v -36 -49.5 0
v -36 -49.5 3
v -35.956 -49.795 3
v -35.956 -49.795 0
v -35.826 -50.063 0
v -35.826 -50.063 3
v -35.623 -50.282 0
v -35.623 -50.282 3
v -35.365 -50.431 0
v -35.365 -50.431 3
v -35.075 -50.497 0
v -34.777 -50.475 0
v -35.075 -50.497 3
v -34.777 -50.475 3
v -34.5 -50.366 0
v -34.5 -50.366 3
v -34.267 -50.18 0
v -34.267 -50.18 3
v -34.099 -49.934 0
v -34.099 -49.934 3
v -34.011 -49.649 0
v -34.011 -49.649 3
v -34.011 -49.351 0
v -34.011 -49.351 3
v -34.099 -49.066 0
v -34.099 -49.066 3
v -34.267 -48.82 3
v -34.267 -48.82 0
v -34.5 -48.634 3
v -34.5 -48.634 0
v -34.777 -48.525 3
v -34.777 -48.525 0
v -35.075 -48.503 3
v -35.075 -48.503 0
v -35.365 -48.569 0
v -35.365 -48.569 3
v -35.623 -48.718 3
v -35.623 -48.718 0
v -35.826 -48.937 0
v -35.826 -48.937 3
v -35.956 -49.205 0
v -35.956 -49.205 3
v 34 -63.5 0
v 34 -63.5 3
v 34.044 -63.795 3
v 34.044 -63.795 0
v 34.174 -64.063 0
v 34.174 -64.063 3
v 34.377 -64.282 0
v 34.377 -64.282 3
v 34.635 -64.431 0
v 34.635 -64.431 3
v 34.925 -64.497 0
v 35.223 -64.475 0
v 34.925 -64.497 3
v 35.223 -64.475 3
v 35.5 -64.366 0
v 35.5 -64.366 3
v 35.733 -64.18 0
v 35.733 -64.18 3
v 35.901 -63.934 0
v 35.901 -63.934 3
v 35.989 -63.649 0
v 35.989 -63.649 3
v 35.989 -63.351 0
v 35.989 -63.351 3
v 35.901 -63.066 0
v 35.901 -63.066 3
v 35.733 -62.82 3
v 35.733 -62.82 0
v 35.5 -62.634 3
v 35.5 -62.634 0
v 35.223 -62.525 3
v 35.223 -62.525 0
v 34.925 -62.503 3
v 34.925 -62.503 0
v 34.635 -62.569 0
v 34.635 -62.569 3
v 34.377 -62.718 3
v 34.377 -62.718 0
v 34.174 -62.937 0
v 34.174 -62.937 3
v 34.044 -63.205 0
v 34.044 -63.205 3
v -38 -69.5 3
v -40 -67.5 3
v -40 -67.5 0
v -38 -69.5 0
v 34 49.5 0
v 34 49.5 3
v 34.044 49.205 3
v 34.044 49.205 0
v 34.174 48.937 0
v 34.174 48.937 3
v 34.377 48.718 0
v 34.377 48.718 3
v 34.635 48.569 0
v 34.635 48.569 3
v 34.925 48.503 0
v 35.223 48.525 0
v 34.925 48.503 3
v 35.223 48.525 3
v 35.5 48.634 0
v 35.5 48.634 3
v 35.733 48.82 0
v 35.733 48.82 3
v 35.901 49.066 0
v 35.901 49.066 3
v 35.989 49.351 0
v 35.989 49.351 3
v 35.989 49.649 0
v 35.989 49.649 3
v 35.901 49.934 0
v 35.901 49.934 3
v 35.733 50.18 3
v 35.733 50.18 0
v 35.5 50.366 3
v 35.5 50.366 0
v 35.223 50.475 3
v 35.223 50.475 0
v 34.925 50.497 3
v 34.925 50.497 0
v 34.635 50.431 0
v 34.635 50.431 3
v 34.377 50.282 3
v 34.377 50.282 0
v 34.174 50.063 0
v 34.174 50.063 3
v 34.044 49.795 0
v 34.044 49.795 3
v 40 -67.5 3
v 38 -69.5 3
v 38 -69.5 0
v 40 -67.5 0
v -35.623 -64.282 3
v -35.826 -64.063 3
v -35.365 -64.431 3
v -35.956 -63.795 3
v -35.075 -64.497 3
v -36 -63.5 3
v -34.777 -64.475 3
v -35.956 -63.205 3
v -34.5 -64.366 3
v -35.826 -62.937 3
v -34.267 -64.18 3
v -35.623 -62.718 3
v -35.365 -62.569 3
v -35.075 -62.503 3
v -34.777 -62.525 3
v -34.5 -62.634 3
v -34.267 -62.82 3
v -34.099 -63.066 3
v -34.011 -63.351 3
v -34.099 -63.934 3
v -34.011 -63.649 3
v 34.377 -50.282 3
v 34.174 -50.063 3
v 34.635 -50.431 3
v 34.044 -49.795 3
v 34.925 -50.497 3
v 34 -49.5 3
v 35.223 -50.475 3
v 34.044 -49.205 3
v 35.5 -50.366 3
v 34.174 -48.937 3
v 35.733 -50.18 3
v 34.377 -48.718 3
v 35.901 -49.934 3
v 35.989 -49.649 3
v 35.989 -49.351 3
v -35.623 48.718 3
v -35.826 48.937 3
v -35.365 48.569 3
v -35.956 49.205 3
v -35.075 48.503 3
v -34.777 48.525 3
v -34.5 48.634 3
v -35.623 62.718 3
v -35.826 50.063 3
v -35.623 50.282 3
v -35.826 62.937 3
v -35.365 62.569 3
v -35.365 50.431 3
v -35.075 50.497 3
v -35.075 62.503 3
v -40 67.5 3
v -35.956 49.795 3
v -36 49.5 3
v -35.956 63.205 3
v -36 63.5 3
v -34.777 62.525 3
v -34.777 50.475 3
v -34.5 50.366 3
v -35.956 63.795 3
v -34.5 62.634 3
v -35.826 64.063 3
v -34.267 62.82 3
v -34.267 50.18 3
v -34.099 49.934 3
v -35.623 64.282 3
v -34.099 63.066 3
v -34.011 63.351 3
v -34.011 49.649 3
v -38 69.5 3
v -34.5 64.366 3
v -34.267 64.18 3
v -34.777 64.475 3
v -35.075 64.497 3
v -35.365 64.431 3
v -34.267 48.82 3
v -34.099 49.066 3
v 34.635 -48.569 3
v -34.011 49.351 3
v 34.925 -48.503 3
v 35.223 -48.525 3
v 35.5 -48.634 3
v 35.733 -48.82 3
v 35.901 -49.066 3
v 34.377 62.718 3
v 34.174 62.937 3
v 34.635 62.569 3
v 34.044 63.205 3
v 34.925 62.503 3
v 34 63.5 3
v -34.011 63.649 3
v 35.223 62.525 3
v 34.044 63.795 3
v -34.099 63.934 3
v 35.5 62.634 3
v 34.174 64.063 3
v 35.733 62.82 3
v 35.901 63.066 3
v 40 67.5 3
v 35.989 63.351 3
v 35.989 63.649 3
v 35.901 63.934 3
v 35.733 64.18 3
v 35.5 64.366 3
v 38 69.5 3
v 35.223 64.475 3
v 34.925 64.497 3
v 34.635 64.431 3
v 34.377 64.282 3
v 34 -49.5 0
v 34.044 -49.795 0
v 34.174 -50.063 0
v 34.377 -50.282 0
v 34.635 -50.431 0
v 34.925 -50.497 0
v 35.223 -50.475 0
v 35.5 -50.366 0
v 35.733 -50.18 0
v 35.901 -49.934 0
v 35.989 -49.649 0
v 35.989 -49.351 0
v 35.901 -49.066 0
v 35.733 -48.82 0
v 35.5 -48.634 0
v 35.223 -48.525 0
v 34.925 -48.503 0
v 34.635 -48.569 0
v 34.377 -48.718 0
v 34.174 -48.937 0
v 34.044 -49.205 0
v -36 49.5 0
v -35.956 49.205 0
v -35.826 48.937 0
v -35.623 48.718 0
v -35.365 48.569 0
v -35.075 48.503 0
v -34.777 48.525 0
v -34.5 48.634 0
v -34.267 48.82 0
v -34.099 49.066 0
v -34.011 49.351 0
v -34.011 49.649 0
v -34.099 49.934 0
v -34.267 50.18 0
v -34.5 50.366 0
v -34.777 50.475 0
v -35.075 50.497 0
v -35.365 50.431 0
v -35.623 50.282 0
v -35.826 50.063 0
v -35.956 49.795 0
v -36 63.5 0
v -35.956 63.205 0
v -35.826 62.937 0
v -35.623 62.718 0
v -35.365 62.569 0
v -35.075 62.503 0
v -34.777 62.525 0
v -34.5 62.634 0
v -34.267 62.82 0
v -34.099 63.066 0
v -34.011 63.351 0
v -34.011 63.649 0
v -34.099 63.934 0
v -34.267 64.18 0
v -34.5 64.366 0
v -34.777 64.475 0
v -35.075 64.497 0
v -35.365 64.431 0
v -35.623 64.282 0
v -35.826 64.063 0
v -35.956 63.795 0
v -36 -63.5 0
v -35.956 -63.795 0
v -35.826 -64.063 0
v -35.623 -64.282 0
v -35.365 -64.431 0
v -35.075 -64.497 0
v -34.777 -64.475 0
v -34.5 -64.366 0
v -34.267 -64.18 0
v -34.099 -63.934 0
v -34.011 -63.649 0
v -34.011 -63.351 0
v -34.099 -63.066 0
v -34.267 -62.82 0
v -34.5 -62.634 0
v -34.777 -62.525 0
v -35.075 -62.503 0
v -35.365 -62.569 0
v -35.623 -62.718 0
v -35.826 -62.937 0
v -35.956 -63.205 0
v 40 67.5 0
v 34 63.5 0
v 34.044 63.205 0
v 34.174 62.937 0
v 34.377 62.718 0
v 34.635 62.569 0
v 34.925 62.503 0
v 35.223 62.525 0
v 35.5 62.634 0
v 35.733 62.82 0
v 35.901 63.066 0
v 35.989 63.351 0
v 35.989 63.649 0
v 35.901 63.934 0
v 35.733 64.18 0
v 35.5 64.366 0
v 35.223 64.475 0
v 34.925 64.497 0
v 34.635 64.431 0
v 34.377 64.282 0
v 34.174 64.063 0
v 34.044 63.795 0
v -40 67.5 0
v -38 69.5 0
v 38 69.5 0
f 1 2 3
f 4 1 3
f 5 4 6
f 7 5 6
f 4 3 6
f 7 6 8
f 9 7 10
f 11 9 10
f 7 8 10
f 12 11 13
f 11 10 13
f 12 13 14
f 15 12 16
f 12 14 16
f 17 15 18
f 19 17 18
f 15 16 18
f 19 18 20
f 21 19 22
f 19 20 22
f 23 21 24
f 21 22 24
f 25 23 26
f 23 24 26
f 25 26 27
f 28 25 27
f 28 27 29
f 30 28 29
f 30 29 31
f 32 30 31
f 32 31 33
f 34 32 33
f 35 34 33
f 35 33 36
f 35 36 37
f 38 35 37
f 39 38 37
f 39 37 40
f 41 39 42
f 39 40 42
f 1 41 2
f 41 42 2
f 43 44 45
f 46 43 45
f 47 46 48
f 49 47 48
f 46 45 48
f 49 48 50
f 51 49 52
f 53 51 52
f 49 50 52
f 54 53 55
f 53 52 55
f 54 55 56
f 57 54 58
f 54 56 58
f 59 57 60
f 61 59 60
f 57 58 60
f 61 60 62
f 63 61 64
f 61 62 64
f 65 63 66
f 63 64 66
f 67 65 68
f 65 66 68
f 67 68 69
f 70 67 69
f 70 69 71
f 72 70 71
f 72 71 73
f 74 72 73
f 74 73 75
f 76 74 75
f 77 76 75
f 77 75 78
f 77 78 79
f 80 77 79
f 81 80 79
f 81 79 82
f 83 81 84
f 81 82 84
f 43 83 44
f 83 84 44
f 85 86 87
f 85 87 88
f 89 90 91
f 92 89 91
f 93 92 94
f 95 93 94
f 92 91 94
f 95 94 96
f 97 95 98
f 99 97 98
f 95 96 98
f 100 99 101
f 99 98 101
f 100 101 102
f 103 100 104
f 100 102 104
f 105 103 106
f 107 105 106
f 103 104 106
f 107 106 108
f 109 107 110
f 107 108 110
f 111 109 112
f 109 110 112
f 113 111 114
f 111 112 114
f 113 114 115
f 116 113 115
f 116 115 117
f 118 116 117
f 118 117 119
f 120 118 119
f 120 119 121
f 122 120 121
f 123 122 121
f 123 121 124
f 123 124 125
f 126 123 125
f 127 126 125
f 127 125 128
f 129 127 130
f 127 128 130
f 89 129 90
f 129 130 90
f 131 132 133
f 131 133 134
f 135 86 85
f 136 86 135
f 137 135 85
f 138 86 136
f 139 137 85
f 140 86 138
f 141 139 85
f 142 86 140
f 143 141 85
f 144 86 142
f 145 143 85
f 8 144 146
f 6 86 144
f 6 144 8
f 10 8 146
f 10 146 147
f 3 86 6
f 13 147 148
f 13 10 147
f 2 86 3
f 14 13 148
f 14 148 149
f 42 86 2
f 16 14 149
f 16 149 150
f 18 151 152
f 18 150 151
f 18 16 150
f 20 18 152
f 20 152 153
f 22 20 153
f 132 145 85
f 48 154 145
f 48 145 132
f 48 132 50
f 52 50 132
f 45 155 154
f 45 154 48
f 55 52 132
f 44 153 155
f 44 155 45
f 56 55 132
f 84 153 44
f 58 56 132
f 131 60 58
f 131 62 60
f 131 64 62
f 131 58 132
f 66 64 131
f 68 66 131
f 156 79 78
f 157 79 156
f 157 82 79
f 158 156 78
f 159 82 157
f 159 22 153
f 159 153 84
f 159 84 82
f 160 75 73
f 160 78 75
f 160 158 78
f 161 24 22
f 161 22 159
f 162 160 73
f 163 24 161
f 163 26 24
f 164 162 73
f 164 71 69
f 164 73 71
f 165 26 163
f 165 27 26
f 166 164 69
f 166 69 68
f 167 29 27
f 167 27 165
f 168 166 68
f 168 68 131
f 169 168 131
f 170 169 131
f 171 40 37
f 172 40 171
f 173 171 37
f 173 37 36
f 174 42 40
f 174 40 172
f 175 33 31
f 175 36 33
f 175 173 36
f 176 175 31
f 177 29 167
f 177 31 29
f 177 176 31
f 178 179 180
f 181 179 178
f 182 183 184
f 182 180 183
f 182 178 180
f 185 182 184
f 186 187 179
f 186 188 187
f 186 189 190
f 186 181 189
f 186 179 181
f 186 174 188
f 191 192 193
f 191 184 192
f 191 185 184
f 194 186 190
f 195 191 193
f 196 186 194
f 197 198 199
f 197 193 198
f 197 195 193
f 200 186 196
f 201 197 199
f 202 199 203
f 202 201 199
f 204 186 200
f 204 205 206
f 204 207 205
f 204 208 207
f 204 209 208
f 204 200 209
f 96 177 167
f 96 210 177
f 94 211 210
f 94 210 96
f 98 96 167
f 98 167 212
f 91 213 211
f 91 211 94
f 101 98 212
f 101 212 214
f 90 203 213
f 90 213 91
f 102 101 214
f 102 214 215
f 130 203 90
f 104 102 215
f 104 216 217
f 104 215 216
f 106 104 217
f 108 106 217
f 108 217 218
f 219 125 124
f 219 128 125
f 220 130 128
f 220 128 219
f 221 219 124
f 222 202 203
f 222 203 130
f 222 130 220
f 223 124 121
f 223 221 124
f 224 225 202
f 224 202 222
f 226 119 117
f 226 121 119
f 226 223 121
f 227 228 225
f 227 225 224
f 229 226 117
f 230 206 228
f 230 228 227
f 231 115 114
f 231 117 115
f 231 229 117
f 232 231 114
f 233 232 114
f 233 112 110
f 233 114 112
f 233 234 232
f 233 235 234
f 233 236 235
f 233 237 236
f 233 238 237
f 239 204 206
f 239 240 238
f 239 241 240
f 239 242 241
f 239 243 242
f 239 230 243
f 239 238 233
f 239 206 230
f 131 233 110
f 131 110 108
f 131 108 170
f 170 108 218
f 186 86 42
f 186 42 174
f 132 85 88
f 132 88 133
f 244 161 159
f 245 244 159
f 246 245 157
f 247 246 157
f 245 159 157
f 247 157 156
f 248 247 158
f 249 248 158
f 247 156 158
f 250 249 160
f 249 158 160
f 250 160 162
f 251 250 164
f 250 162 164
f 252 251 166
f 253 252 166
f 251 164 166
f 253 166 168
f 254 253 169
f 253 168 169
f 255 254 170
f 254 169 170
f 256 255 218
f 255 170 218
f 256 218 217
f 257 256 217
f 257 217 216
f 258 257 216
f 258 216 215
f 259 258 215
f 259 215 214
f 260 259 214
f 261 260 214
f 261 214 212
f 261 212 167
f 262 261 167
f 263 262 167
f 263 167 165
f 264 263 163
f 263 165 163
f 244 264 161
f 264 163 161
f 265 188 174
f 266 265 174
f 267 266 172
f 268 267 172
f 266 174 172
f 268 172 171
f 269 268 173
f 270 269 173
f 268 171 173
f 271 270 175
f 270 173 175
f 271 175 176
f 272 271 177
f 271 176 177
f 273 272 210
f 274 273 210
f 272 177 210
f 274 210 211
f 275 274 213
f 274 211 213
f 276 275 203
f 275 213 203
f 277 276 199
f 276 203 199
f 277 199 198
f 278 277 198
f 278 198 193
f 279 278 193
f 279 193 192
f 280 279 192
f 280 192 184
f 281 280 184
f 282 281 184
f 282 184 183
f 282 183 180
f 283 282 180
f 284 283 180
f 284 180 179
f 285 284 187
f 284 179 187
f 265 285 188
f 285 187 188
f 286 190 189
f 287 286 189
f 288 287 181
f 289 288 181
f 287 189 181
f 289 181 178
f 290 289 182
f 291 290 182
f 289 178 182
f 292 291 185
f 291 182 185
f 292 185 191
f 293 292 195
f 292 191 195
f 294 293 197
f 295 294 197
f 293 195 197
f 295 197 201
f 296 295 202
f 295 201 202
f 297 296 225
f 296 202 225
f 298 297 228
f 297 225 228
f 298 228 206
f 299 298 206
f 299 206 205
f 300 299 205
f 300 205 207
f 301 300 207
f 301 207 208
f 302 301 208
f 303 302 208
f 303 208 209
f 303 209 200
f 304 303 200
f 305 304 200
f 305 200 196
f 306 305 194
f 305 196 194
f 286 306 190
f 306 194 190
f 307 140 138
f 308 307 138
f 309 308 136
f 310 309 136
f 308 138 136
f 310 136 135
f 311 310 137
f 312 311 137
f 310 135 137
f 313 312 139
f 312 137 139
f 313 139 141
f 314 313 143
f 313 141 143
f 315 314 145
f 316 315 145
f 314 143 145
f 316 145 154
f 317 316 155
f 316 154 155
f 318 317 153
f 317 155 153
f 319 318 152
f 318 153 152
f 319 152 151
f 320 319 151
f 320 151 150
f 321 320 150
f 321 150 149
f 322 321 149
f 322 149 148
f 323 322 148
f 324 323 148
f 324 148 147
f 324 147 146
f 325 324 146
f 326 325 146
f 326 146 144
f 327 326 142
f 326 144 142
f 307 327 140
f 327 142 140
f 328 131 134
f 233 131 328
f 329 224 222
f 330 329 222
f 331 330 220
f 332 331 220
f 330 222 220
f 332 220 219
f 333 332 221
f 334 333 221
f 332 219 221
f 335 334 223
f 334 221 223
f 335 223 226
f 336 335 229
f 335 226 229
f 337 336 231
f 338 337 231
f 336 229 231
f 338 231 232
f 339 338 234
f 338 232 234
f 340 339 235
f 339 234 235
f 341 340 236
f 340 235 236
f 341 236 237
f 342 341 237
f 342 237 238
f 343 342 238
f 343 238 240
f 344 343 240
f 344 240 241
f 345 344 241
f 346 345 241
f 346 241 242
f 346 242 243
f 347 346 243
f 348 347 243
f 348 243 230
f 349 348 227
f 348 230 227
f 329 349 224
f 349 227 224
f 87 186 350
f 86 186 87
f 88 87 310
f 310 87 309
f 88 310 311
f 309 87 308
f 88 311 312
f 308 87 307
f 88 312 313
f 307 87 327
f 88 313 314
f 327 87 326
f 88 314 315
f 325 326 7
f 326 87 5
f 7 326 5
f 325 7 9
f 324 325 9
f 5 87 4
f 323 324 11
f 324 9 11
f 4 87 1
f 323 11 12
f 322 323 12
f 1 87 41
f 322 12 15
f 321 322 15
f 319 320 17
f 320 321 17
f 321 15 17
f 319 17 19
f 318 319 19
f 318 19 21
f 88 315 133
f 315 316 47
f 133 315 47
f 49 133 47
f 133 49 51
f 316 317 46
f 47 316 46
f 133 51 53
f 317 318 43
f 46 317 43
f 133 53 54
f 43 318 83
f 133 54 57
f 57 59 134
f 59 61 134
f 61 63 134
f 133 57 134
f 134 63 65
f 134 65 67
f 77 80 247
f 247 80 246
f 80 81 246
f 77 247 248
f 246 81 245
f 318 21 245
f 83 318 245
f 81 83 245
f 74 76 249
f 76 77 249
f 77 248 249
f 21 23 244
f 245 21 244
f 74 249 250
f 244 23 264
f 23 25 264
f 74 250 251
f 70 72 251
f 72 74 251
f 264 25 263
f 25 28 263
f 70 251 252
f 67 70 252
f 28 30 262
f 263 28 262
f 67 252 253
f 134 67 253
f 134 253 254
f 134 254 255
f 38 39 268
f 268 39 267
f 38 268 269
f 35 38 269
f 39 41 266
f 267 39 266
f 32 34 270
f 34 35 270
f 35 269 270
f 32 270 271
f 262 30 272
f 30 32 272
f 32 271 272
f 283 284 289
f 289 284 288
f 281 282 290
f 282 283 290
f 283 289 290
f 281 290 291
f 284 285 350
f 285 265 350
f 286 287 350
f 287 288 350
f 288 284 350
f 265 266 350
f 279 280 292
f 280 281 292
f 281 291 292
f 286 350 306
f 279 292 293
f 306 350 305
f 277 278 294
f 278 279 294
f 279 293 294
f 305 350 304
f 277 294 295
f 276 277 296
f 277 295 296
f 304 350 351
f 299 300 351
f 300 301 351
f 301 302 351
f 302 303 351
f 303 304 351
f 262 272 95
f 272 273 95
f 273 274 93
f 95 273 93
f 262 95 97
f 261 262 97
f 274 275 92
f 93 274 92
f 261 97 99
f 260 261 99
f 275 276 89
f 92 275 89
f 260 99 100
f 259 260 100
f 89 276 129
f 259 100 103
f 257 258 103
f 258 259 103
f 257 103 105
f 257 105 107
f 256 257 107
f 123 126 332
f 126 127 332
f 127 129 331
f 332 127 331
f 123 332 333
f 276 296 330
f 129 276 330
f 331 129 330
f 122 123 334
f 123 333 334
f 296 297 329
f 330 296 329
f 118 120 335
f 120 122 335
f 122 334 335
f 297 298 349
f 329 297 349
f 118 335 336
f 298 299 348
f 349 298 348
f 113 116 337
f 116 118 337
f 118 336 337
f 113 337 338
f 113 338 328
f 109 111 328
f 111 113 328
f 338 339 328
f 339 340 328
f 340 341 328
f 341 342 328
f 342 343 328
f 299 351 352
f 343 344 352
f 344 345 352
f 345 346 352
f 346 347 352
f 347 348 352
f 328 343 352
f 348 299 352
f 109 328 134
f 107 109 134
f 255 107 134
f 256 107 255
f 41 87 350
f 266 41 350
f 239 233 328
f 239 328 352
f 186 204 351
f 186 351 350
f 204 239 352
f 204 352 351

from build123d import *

# Parameters (mm, degrees)
SKETCH1_R           = 1
BOSS_EXTRUDE1_DEPTH = 3


with BuildPart() as part:
    # Sketch1 → Boss-Extrude1 (new body)
    with BuildSketch(Plane.XY.offset(3)):
        Polygon((-38, -69.5), (38, -69.5), (40, -67.5), (40, 67.5), (38, 69.5), (-38, 69.5), (-40, 67.5), (-40, -67.5), align=None)
        with Locations(Location((35, 49.5, 0), (0, 0, 180))):
            Circle(SKETCH1_R, mode=Mode.SUBTRACT)
        with Locations(Location((-35, -63.5, 0), (0, 0, 180))):
            Circle(SKETCH1_R, mode=Mode.SUBTRACT)
        with Locations(Location((35, 63.5, 0), (0, 0, 180))):
            Circle(SKETCH1_R, mode=Mode.SUBTRACT)
        with Locations(Location((-35, -49.5, 0), (0, 0, 180))):
            Circle(SKETCH1_R, mode=Mode.SUBTRACT)
        with Locations(Location((-35, 49.5, 0), (0, 0, 180))):
            Circle(SKETCH1_R, mode=Mode.SUBTRACT)
        with Locations(Location((-35, 63.5, 0), (0, 0, 180))):
            Circle(SKETCH1_R, mode=Mode.SUBTRACT)
        with Locations(Location((35, -49.5, 0), (0, 0, 180))):
            Circle(SKETCH1_R, mode=Mode.SUBTRACT)
        with Locations(Location((35, -63.5, 0), (0, 0, 180))):
            Circle(SKETCH1_R, mode=Mode.SUBTRACT)
    extrude(amount=-BOSS_EXTRUDE1_DEPTH)


solid = part.part
